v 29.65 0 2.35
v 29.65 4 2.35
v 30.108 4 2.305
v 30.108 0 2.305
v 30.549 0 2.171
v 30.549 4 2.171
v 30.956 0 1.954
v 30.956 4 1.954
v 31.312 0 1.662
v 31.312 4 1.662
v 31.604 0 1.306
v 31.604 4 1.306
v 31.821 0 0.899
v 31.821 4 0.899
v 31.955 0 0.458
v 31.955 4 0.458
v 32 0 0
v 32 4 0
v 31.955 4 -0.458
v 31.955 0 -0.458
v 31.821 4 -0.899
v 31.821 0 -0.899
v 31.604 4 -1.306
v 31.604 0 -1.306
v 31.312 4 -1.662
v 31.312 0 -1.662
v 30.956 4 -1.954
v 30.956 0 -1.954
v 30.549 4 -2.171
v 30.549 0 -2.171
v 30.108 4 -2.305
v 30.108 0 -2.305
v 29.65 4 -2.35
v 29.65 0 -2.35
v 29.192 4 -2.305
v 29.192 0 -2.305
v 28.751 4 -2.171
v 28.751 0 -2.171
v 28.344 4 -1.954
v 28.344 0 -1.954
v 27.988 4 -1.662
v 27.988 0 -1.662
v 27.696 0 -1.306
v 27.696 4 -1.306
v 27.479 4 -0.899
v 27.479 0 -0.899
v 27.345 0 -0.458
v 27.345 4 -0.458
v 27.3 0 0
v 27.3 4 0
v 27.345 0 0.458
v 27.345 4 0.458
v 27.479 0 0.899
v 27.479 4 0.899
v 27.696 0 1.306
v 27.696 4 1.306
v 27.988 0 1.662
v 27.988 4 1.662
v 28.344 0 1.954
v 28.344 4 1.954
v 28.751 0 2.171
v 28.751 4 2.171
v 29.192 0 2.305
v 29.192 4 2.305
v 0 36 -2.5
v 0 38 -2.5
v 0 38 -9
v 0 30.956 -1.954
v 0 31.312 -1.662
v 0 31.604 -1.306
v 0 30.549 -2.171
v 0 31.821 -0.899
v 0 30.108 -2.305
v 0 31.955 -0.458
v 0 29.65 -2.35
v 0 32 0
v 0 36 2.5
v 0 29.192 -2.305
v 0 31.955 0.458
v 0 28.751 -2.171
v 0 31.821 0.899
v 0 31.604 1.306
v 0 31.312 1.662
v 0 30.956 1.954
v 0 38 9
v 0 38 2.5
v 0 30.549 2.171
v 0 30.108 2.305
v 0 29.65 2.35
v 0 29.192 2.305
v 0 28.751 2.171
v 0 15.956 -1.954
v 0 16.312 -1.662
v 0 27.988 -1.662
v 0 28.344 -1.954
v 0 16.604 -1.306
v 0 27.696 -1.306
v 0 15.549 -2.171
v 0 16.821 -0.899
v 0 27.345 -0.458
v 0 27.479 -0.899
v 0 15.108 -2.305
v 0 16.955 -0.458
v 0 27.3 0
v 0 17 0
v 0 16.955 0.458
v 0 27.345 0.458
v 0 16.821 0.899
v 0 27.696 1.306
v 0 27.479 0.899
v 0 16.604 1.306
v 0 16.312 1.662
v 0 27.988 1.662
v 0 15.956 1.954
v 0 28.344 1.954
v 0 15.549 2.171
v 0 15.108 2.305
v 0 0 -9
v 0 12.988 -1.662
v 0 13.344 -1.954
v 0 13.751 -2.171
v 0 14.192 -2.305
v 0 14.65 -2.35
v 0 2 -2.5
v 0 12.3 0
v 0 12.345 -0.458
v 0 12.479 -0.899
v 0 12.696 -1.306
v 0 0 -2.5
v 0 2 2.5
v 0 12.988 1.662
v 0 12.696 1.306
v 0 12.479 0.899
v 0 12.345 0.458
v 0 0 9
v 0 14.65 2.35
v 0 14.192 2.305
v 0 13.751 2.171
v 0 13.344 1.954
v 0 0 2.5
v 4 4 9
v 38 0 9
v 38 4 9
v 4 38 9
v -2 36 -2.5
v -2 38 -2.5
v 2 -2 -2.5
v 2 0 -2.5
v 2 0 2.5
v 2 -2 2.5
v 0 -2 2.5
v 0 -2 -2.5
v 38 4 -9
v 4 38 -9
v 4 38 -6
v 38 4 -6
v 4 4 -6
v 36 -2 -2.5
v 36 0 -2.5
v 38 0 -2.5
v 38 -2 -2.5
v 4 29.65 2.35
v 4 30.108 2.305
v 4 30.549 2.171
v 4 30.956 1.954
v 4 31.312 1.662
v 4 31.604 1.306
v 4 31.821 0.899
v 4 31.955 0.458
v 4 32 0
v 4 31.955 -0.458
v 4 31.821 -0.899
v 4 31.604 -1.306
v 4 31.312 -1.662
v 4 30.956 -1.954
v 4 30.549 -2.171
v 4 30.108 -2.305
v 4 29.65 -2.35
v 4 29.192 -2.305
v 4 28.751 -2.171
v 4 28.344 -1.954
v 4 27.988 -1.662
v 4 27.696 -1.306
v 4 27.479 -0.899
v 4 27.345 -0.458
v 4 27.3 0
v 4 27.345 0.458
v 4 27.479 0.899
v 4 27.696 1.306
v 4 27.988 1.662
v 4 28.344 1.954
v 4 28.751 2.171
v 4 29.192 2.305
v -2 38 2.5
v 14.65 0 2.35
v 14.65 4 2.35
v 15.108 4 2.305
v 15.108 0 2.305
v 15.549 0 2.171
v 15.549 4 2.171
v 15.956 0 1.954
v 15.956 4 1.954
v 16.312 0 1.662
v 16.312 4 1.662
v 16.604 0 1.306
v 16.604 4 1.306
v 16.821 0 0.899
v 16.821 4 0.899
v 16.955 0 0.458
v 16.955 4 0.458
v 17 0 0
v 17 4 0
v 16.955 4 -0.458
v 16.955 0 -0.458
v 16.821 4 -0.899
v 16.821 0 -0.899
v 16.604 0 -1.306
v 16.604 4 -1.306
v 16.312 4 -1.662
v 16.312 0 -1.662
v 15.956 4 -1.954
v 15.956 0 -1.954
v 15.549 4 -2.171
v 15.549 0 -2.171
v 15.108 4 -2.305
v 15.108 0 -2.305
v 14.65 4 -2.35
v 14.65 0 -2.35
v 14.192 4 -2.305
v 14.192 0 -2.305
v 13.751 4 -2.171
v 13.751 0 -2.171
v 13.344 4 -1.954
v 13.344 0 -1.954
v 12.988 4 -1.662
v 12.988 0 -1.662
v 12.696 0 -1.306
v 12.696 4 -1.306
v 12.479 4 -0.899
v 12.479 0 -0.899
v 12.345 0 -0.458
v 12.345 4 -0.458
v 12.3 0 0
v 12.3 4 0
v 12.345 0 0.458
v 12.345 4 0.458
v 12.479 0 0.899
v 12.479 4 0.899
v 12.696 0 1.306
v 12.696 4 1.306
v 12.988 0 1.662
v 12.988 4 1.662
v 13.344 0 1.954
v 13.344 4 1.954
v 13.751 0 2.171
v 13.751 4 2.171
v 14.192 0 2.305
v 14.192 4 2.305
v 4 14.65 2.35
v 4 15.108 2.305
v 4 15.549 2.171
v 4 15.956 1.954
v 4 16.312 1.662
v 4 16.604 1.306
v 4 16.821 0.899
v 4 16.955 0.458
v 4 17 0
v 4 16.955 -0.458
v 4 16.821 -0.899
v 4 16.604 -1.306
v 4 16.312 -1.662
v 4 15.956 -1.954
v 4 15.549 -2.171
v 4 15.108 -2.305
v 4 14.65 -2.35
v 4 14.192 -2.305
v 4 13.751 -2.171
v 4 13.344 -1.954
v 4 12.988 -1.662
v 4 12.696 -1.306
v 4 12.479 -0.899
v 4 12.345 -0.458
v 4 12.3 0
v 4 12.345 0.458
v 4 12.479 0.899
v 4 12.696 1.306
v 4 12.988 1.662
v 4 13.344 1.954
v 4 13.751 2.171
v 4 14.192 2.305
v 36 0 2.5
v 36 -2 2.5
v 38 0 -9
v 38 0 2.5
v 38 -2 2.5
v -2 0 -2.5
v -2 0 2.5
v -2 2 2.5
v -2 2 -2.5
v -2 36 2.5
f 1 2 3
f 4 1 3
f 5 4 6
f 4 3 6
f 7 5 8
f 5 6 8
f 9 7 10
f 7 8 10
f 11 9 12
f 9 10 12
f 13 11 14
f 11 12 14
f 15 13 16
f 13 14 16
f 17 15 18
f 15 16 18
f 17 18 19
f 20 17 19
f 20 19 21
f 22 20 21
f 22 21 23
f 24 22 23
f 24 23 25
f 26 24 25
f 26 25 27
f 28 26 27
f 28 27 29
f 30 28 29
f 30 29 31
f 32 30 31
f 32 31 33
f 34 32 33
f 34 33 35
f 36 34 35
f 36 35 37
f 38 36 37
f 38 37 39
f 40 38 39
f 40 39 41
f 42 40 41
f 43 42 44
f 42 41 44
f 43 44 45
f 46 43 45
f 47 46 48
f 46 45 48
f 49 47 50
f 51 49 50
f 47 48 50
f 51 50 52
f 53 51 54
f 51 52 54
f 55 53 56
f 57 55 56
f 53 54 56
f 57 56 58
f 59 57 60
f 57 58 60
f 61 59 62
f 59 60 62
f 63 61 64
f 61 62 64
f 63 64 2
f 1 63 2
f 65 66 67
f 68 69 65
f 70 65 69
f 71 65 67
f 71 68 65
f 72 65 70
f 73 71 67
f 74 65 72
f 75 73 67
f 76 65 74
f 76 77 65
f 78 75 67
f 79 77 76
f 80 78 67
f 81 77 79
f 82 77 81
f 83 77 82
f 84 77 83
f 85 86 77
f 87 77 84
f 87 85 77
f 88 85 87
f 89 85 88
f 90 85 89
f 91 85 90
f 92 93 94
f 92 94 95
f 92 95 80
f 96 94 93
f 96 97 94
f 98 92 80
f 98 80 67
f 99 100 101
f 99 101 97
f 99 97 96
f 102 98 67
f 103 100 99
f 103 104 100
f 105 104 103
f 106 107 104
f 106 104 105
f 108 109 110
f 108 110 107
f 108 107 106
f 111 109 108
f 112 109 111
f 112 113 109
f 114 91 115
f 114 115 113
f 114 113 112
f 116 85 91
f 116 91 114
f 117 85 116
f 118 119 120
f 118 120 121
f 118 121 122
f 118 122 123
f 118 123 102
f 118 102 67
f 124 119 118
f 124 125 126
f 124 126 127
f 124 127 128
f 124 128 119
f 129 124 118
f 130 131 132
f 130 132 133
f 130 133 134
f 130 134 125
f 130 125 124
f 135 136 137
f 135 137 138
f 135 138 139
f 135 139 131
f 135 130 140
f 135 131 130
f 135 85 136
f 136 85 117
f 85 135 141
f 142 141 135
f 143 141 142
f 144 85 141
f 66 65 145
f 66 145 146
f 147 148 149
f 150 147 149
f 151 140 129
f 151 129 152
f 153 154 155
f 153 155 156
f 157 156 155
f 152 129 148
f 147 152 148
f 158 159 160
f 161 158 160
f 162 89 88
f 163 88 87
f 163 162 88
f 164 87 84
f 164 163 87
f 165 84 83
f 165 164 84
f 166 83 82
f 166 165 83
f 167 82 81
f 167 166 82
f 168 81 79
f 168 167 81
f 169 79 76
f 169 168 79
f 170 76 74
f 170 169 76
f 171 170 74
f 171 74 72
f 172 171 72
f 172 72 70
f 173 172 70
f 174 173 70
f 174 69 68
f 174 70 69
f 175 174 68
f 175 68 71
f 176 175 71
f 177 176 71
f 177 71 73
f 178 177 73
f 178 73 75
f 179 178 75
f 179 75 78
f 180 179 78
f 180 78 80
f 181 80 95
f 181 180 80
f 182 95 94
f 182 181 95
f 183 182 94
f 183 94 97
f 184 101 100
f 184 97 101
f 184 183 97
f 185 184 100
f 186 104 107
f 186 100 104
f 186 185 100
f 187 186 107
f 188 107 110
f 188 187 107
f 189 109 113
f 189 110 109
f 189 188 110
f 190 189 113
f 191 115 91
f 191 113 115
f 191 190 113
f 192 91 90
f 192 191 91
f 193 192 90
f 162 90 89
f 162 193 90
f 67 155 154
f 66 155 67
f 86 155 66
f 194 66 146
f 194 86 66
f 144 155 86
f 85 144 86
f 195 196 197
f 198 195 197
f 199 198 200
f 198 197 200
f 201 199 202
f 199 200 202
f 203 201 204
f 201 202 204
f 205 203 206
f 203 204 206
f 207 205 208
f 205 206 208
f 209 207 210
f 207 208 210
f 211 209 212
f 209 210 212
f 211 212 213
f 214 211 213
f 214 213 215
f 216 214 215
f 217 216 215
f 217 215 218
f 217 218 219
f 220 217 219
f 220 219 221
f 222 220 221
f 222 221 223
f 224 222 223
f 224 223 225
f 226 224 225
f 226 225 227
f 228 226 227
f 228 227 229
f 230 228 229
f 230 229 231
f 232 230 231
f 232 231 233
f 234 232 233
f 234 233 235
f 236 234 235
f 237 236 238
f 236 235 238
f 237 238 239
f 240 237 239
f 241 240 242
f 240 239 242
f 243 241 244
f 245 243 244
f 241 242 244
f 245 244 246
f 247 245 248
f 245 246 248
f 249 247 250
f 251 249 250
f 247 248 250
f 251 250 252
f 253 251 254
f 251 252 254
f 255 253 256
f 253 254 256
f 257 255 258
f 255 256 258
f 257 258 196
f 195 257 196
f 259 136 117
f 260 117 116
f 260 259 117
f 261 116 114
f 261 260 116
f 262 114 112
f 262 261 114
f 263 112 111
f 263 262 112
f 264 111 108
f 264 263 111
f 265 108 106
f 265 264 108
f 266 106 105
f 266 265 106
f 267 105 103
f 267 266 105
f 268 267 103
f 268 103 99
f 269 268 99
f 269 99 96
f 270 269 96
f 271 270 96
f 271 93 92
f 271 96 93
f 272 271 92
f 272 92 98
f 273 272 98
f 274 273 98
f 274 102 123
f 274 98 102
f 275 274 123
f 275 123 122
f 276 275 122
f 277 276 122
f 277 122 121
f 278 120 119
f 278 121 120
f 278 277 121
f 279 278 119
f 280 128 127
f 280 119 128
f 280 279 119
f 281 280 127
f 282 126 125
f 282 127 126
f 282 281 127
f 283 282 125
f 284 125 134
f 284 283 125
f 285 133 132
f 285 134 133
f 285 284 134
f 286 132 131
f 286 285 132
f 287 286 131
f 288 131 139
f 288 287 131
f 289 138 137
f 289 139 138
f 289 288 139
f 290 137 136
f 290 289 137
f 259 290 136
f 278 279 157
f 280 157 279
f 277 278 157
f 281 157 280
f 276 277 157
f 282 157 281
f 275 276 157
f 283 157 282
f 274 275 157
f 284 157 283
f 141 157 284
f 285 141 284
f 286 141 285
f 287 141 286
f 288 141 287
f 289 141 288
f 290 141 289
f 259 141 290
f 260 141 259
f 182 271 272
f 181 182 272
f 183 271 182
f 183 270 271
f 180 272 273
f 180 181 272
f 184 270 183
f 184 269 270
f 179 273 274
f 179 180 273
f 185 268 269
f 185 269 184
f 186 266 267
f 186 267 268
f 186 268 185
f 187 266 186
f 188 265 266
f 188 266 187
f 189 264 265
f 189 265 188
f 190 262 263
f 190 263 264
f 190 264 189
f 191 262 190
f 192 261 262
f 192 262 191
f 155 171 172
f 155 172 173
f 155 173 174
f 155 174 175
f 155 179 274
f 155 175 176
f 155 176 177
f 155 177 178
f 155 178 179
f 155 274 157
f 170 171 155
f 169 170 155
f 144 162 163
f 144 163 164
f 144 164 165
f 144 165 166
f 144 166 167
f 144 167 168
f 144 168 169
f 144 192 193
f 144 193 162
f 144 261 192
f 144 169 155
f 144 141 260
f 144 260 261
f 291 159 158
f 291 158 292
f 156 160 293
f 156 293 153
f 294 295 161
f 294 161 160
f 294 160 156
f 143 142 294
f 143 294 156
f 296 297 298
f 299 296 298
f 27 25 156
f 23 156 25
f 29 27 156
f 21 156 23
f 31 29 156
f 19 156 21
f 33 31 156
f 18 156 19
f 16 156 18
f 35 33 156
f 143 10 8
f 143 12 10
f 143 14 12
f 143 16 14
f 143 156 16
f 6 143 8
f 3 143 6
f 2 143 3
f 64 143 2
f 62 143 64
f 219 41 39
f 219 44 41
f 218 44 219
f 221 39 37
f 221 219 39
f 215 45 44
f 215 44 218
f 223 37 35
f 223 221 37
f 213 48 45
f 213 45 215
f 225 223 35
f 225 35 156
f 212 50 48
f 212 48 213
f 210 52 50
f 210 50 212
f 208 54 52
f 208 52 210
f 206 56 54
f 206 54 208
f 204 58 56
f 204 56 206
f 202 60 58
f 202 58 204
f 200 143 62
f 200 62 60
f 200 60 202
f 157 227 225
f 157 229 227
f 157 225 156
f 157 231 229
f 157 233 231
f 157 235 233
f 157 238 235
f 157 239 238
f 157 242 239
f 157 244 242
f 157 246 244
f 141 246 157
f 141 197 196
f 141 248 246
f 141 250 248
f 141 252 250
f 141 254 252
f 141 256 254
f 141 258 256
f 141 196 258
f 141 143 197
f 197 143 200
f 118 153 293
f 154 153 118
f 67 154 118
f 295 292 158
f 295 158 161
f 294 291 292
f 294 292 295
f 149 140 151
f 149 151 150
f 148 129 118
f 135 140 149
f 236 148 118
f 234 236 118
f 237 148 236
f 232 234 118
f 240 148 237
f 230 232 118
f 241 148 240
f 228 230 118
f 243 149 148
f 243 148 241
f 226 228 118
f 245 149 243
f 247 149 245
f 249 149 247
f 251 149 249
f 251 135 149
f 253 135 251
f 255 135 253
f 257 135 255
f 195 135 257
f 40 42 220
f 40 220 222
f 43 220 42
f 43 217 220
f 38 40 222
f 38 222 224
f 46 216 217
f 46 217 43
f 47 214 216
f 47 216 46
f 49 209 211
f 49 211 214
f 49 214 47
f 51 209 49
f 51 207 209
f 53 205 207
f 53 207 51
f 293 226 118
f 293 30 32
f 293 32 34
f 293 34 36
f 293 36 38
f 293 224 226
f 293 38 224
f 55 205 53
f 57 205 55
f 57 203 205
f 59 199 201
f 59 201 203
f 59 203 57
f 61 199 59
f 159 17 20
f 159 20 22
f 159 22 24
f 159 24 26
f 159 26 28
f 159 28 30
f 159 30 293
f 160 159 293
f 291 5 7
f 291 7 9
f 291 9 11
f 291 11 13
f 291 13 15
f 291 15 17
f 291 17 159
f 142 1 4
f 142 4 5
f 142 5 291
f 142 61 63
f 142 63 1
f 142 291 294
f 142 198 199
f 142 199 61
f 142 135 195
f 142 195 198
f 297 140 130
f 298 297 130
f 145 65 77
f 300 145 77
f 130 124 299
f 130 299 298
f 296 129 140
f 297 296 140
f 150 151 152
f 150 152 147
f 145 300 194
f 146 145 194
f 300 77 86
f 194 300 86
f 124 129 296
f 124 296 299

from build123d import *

# Parameters (mm, degrees)
EXTRUDE_1_DEPTH     = 9
SKETCH_3_R          = 2.35
CUT_EXTRUDE_1_DEPTH = 5
SKETCH_4_W          = 2
SKETCH_4_H          = 5
EXTRUDE_3_DEPTH     = 2
EXTRUDE_4_DEPTH     = 3


with BuildPart() as part:
    # Эскиз1 → Бобышка-Вытянуть1 (new body, symmetric)
    with BuildSketch(Plane.XY):
        Polygon((0, 38), (0, 0), (38, 0), (38, 4), (4, 4), (4, 38), align=None)
    extrude(amount=EXTRUDE_1_DEPTH, both=True)

    # Эскиз3 → Вырез-Вытянуть1 (cut, through all)
    with BuildSketch(Plane(origin=(0, 4, 0), x_dir=(1, 0, 0), z_dir=(0, 1, 0))):
        with Locations(Location((14.65, 0, 0), (0, 0, 270))):  # turned: the seam where the file's is
            Circle(SKETCH_3_R)
        with Locations(Location((29.65, 0, 0), (0, 0, 270))):  # turned: the seam where the file's is
            Circle(SKETCH_3_R)
    cut_extrude_1 = extrude(amount=-CUT_EXTRUDE_1_DEPTH, mode=Mode.SUBTRACT)

    # Эскиз4 → Бобышка-Вытянуть3 (add)
    with BuildSketch(Plane.XZ):
        with Locations((1, 0)):
            Rectangle(SKETCH_4_W, SKETCH_4_H)
        with Locations((37, 0)):
            Rectangle(SKETCH_4_W, SKETCH_4_H)
    extrude_3 = extrude(amount=EXTRUDE_3_DEPTH)

    # Зеркальное отражение3: Вырез-Вытянуть1, Бобышка-Вытянуть3 across plane
    add(cut_extrude_1.mirror(Plane(origin=(0, 0, 0), x_dir=(0, 0, 1), z_dir=(-0.707106781, 0.707106781, 0))), mode=Mode.SUBTRACT)
    add(extrude_3.mirror(Plane(origin=(0, 0, 0), x_dir=(0, 0, 1), z_dir=(-0.707106781, 0.707106781, 0))))

    # Эскиз2 → Бобышка-Вытянуть4 (add)
    with BuildSketch(Plane.XY.offset(-9)):
        Polygon((4, 38), (38, 4), (4, 4), align=None)
    extrude(amount=EXTRUDE_4_DEPTH)


solid = part.part
